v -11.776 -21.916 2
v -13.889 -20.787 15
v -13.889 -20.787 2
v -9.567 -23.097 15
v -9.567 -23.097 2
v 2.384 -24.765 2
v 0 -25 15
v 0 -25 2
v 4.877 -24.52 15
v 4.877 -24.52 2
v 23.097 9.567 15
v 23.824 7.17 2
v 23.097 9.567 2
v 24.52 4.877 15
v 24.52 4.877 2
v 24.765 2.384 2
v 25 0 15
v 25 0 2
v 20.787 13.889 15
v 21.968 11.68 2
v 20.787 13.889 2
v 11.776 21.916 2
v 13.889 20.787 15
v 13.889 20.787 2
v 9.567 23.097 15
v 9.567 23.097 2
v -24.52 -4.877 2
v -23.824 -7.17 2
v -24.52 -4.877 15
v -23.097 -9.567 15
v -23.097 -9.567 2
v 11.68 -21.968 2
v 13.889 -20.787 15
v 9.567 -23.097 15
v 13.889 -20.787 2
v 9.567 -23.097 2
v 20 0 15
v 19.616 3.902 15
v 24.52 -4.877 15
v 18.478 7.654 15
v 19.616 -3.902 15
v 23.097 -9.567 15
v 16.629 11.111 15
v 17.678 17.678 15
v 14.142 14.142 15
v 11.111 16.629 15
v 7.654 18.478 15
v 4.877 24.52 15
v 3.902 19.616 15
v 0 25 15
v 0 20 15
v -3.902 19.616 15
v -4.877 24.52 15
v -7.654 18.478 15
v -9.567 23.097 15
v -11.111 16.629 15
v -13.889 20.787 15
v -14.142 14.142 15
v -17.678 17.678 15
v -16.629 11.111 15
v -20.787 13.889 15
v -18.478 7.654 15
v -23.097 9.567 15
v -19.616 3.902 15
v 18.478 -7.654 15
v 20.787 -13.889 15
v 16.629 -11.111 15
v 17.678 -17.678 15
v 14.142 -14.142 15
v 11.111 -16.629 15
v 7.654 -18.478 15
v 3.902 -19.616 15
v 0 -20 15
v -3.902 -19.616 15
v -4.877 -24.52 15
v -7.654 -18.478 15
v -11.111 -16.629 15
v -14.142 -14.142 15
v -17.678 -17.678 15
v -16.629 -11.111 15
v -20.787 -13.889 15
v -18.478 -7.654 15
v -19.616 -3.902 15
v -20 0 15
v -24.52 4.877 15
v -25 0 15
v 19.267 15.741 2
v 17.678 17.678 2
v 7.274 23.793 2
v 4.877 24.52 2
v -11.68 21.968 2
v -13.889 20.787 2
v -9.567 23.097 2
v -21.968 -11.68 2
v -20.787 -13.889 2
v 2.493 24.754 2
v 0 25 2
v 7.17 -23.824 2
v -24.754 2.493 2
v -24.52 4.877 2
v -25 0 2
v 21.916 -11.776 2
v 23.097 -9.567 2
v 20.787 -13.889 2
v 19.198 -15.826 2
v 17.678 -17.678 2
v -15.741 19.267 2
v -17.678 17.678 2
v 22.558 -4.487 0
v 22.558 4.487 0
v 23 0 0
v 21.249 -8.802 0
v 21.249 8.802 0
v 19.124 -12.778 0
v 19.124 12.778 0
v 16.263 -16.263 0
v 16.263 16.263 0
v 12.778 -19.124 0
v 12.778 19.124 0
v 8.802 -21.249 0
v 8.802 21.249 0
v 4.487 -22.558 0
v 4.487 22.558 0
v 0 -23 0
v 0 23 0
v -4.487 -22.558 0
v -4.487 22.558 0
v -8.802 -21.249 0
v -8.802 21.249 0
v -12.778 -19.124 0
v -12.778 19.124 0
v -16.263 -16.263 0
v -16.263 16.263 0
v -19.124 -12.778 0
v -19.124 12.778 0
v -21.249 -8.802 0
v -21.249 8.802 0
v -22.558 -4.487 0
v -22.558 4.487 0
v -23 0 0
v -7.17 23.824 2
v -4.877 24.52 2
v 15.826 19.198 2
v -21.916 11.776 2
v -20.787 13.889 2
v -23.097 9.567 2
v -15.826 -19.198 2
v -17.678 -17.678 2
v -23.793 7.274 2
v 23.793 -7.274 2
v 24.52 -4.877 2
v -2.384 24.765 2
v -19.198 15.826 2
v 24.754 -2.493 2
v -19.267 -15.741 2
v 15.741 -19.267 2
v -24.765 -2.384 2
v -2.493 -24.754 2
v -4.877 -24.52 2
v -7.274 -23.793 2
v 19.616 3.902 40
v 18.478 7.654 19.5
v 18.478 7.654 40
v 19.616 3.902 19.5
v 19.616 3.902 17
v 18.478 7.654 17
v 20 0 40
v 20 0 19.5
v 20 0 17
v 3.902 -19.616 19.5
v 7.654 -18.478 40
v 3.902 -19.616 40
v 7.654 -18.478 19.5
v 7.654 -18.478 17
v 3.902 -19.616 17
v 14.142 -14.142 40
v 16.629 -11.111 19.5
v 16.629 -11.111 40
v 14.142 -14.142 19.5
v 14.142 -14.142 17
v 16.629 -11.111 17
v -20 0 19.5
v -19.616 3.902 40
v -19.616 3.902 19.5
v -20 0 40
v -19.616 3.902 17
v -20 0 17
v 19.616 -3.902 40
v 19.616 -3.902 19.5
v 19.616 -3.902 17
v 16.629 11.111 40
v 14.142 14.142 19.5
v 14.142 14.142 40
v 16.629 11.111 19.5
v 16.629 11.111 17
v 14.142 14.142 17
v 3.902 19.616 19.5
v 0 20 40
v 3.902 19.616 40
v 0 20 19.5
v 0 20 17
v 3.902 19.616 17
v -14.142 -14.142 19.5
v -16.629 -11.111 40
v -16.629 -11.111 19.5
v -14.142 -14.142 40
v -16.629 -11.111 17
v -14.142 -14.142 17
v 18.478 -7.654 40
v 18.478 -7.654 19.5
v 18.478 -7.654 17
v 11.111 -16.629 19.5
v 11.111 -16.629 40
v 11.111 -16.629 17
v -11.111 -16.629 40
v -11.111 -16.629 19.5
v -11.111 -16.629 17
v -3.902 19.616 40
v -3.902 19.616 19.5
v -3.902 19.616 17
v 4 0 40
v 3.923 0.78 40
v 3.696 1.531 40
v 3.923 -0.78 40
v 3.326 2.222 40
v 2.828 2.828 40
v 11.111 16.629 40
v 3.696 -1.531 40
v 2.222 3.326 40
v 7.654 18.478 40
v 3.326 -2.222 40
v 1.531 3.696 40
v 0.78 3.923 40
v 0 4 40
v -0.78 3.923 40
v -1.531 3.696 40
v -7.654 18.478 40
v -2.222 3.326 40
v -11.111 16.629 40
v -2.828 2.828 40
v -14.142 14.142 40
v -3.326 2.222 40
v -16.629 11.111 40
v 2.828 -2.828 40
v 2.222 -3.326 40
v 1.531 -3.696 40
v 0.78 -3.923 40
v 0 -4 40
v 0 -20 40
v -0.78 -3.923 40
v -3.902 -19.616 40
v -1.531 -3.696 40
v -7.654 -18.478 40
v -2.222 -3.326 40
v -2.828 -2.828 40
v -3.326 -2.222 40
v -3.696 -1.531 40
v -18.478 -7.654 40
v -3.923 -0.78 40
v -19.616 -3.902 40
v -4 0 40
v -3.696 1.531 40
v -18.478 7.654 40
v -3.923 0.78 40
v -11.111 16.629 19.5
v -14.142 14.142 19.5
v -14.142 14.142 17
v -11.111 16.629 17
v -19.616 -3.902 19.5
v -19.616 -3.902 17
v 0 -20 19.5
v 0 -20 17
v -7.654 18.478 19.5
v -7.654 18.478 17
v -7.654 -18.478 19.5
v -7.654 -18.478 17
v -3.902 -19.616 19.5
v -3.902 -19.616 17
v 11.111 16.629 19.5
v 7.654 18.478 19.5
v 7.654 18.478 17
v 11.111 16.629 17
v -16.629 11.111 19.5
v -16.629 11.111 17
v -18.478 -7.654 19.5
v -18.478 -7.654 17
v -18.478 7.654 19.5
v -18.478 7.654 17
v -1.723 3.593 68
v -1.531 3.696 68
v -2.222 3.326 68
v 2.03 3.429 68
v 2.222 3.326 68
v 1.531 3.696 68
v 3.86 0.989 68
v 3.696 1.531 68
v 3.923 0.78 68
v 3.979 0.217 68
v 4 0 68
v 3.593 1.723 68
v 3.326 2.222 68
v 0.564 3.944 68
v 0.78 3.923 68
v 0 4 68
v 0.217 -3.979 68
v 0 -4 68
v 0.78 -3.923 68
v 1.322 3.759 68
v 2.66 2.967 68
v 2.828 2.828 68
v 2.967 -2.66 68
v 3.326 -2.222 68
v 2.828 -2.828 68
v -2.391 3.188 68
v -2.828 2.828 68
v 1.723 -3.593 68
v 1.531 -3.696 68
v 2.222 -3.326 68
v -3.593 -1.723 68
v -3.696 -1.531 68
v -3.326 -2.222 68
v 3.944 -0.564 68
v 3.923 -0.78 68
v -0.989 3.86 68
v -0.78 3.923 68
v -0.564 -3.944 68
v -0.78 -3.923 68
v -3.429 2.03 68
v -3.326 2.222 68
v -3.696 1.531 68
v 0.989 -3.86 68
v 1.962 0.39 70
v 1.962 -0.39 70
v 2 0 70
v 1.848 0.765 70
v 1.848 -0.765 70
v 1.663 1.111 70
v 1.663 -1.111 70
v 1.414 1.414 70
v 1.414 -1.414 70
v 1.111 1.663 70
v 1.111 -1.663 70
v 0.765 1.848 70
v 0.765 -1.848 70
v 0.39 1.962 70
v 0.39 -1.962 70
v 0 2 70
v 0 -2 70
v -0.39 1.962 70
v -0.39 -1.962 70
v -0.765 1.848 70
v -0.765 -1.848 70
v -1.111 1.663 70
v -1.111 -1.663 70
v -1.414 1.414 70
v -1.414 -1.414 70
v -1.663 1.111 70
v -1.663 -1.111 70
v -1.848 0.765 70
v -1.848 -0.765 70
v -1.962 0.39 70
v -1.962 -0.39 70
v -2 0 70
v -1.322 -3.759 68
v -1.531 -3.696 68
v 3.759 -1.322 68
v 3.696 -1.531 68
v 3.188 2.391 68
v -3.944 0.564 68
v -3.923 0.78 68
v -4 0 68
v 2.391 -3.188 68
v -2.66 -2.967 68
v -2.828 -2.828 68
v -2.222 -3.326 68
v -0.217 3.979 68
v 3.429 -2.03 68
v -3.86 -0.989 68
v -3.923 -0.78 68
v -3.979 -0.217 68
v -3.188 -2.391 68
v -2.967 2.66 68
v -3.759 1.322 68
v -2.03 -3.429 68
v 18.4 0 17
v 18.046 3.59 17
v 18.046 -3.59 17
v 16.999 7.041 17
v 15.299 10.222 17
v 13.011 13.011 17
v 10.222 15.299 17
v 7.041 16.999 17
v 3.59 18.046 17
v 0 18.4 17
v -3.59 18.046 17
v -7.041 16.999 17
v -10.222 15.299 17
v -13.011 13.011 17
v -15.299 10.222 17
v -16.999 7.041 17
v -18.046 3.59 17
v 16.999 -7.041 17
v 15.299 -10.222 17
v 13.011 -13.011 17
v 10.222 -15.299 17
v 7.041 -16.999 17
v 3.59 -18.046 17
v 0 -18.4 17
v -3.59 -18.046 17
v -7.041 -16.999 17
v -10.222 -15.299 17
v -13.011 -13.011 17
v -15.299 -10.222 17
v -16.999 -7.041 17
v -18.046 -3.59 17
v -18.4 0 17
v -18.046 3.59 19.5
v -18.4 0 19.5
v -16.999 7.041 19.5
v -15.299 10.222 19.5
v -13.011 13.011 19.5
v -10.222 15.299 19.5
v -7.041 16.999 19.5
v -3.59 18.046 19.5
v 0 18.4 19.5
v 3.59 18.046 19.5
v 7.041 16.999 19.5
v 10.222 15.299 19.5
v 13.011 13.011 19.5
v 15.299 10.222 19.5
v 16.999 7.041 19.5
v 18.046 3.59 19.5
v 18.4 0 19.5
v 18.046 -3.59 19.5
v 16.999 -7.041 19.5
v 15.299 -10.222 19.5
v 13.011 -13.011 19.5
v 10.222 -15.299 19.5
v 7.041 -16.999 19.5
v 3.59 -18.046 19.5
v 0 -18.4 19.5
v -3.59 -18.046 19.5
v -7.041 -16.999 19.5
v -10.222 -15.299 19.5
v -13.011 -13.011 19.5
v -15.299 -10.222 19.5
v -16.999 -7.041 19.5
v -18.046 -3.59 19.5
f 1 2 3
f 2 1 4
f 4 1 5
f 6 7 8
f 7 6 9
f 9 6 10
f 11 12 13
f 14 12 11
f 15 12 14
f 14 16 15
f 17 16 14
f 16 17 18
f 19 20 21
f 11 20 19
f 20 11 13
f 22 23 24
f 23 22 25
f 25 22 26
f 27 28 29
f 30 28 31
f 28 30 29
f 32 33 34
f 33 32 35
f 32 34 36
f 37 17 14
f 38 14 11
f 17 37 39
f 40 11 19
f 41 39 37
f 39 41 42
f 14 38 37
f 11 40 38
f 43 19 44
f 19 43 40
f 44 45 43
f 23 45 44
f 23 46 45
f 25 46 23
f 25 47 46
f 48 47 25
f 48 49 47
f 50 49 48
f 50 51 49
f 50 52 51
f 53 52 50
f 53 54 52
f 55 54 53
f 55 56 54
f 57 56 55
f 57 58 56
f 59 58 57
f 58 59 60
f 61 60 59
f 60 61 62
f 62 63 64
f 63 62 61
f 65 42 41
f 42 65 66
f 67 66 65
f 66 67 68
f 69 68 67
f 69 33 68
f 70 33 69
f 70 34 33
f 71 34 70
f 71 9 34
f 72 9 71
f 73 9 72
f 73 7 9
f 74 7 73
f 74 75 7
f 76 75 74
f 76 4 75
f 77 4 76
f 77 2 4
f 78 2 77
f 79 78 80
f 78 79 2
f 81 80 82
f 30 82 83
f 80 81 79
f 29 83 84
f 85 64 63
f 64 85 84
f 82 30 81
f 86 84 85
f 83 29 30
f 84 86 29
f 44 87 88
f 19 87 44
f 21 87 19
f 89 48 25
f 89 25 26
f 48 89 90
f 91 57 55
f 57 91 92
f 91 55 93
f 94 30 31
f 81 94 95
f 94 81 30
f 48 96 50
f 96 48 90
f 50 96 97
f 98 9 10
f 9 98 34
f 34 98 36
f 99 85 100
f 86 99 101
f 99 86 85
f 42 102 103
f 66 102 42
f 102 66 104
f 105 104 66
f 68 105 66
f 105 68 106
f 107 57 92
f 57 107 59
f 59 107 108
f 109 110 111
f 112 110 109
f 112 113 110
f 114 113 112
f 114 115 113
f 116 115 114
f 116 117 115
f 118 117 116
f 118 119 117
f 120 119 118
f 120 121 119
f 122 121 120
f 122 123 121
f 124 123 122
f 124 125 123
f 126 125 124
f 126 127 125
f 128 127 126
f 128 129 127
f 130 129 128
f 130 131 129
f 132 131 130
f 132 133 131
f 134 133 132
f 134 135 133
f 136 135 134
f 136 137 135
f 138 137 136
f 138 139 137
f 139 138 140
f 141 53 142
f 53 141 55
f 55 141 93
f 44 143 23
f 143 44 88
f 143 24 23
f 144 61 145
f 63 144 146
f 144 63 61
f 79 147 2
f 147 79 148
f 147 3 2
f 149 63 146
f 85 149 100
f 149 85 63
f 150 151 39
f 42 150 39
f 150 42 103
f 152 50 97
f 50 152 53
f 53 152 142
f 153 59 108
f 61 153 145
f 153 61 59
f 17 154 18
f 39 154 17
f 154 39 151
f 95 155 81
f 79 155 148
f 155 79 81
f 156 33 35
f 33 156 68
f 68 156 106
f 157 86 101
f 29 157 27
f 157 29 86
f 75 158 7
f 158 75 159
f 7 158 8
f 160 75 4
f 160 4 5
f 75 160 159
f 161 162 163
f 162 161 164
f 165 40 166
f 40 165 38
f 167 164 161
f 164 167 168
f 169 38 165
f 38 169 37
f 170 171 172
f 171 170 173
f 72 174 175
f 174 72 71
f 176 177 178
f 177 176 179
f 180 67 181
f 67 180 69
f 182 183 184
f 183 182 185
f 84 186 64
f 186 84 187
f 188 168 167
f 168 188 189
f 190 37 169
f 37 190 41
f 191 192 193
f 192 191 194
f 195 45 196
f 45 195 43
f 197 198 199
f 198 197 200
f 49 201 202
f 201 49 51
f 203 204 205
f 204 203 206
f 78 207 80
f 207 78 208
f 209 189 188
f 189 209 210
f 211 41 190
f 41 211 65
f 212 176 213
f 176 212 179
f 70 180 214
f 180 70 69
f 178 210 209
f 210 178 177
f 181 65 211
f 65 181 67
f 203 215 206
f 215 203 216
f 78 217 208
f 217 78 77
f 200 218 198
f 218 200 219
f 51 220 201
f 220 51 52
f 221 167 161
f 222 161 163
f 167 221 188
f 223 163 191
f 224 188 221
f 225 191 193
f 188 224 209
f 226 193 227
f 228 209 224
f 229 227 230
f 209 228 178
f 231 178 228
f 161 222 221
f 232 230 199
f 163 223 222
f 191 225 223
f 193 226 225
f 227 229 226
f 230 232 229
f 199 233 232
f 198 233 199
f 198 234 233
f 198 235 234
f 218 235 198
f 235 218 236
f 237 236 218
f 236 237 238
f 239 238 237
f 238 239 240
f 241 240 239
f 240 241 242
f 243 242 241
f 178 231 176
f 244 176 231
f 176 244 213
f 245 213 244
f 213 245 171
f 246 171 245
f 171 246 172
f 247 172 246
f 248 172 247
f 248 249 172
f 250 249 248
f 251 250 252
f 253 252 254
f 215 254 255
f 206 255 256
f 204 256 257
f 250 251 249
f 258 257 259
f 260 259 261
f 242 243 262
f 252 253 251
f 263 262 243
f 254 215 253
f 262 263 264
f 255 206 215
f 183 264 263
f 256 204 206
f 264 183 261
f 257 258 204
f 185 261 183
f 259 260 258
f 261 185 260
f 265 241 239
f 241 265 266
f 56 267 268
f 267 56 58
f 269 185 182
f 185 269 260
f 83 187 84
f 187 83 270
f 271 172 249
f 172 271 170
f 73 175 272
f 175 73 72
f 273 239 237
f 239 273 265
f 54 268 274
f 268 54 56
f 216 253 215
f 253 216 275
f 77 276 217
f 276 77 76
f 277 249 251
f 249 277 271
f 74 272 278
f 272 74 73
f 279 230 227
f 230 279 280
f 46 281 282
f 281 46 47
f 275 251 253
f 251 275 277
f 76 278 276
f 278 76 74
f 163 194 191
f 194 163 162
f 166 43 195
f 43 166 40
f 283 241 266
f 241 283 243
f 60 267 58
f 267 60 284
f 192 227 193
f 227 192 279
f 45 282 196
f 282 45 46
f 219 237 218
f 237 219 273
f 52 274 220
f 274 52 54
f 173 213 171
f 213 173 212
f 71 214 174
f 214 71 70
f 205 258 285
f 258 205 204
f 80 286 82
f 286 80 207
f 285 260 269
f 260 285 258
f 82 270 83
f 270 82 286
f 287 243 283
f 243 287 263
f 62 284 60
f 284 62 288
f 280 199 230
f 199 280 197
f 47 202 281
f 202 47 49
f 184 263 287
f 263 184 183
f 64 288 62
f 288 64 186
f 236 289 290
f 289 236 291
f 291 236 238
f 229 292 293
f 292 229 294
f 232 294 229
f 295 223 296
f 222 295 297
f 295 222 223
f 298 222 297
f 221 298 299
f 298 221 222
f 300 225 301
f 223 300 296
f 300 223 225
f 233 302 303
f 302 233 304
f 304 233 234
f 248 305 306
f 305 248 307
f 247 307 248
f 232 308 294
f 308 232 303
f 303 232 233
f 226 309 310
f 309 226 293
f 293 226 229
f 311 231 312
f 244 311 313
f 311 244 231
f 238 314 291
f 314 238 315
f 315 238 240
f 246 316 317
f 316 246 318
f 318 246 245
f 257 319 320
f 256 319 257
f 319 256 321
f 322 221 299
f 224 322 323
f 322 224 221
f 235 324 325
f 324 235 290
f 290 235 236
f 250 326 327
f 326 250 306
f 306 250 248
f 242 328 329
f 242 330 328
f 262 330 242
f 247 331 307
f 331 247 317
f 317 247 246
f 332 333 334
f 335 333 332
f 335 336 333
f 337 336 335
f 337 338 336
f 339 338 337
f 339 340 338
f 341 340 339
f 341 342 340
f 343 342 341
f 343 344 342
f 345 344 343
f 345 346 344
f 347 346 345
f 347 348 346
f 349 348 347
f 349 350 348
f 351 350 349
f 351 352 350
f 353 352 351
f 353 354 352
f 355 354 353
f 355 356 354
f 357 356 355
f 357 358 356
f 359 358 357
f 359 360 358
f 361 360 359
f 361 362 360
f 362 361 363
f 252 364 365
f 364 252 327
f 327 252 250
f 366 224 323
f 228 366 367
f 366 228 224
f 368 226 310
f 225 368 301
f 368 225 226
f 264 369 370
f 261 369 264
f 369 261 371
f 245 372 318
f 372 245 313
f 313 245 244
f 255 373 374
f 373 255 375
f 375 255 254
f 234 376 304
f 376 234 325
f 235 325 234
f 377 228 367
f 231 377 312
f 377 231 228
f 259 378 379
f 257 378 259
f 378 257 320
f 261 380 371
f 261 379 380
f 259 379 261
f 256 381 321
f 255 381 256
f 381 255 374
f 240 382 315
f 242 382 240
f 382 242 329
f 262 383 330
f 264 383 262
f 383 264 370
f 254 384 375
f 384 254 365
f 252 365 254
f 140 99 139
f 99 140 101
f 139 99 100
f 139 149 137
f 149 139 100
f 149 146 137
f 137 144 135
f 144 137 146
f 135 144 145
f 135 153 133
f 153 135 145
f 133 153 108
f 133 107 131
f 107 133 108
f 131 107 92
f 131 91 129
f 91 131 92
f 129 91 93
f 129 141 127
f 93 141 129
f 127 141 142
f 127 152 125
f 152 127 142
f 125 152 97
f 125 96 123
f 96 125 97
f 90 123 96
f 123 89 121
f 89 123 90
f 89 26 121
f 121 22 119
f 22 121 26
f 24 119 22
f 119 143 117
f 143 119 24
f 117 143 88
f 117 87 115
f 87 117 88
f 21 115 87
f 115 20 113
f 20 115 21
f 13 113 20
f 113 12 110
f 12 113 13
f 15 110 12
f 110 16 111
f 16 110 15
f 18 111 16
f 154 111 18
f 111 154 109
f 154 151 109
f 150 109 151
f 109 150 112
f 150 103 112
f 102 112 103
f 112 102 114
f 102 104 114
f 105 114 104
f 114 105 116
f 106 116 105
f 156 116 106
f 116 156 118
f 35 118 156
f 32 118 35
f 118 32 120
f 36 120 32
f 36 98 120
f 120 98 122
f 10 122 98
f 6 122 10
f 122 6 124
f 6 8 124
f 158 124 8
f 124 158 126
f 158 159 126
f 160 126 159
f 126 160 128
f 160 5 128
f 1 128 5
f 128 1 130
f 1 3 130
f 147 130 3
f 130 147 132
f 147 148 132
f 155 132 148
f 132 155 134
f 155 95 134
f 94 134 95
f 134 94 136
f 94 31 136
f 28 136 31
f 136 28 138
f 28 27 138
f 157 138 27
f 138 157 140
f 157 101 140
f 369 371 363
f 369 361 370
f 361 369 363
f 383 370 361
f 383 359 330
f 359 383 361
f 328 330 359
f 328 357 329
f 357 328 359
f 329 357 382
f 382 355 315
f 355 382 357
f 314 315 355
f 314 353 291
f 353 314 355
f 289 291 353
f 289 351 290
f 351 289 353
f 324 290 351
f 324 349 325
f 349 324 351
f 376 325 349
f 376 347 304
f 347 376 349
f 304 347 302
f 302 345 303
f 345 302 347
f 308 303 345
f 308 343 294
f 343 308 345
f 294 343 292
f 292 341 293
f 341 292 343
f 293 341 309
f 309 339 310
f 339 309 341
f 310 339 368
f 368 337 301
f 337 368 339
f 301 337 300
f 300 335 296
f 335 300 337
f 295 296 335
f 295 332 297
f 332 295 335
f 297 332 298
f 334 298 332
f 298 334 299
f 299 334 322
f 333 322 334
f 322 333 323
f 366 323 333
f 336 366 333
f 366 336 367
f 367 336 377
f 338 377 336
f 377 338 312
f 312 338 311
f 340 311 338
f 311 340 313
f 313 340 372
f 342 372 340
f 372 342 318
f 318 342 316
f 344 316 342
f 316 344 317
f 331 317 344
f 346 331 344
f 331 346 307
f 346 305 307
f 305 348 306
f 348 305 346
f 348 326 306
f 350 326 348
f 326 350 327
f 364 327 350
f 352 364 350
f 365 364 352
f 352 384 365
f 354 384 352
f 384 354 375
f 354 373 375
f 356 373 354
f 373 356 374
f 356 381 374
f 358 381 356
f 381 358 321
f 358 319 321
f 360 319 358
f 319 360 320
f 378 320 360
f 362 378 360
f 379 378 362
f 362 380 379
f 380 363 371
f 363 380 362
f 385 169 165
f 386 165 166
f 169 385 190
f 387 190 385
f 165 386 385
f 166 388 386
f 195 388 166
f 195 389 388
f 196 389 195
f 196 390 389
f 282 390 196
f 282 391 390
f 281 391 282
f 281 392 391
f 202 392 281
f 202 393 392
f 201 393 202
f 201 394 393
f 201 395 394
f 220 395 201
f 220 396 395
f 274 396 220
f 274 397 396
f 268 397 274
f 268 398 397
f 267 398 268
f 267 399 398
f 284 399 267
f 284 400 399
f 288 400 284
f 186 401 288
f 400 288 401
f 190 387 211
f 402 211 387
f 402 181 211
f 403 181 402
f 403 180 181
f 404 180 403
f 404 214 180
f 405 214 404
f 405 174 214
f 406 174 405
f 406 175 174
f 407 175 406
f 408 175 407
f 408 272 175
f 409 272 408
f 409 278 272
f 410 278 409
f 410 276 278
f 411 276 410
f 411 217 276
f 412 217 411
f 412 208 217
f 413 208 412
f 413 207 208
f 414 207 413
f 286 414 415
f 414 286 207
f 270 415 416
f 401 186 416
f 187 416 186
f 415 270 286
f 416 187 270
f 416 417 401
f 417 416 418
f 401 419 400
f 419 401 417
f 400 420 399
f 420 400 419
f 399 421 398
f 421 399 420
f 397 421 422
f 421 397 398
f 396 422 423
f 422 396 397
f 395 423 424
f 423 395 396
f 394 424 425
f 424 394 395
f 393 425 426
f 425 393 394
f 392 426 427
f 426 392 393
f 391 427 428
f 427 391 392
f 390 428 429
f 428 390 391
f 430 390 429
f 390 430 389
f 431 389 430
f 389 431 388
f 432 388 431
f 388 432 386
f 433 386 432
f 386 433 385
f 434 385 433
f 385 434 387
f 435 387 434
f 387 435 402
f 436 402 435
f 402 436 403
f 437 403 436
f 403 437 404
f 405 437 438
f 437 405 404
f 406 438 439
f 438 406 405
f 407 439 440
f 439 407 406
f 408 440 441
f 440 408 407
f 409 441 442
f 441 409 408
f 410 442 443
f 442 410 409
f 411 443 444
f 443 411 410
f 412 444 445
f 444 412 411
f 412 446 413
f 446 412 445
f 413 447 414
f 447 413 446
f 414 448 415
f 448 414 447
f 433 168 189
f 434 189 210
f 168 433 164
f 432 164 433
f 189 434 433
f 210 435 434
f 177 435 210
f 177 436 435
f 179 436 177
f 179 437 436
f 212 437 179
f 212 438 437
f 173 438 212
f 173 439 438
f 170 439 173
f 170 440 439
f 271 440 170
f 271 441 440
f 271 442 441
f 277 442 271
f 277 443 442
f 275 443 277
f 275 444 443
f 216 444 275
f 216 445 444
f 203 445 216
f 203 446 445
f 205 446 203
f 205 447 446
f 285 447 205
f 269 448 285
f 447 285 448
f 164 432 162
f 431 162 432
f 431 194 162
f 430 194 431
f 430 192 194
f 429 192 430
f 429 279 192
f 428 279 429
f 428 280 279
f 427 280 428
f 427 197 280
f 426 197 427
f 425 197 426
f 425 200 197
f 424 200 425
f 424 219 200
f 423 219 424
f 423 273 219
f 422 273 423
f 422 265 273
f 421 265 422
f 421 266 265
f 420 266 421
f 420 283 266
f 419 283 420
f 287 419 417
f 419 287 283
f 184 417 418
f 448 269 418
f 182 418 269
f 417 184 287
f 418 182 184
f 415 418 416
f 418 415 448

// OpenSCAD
$fn = 32;

// ----------------------------------------------------------------------
// Stepped shaft: diameters 50, 40, 8 mm, 70 mm long
// ----------------------------------------------------------------------

// --- parameters (mm) ---
d1 = 50;                  // step 1 diameter
len1 = 15;                // step 1 length
d2 = 40;                  // step 2 diameter
len2 = 25;                // step 2 length
d3 = 8;                   // step 3 diameter
len3 = 30;                // step 3 length
total = 70;               // overall length
chamfer = 2;              // end chamfer
groove_r = 20;            // groove radius
groove_z = 17;            // groove position from the end
groove_w = 2.5;           // groove width
groove_d = 1.6;           // groove depth

difference() {
  /* turned body: stacked cylinders, every step sunk into the bigger one */
  union() {
    cylinder(h = len1, d = d1);
    translate([0, 0, 14.6]) cylinder(h = 25.4, d = d2);
    translate([0, 0, 39.6]) cylinder(h = 30.4, d = d3);
  }
  /* bottom chamfer ring cut */
  rotate_extrude() translate([23, -2.5]) polygon([[0, 0], [4.5, 0], [4.5, 7], [0, 2.5]]);
  /* top chamfer ring cut */
  rotate_extrude() translate([2, 70]) polygon([[0, 0], [4.5, -4.5], [4.5, 2.5], [0, 2.5]]);
  /* circlip groove just behind the shoulder */
  rotate_extrude() translate([groove_r - groove_d, groove_z]) square([groove_d + 2.5, groove_w]);
}
